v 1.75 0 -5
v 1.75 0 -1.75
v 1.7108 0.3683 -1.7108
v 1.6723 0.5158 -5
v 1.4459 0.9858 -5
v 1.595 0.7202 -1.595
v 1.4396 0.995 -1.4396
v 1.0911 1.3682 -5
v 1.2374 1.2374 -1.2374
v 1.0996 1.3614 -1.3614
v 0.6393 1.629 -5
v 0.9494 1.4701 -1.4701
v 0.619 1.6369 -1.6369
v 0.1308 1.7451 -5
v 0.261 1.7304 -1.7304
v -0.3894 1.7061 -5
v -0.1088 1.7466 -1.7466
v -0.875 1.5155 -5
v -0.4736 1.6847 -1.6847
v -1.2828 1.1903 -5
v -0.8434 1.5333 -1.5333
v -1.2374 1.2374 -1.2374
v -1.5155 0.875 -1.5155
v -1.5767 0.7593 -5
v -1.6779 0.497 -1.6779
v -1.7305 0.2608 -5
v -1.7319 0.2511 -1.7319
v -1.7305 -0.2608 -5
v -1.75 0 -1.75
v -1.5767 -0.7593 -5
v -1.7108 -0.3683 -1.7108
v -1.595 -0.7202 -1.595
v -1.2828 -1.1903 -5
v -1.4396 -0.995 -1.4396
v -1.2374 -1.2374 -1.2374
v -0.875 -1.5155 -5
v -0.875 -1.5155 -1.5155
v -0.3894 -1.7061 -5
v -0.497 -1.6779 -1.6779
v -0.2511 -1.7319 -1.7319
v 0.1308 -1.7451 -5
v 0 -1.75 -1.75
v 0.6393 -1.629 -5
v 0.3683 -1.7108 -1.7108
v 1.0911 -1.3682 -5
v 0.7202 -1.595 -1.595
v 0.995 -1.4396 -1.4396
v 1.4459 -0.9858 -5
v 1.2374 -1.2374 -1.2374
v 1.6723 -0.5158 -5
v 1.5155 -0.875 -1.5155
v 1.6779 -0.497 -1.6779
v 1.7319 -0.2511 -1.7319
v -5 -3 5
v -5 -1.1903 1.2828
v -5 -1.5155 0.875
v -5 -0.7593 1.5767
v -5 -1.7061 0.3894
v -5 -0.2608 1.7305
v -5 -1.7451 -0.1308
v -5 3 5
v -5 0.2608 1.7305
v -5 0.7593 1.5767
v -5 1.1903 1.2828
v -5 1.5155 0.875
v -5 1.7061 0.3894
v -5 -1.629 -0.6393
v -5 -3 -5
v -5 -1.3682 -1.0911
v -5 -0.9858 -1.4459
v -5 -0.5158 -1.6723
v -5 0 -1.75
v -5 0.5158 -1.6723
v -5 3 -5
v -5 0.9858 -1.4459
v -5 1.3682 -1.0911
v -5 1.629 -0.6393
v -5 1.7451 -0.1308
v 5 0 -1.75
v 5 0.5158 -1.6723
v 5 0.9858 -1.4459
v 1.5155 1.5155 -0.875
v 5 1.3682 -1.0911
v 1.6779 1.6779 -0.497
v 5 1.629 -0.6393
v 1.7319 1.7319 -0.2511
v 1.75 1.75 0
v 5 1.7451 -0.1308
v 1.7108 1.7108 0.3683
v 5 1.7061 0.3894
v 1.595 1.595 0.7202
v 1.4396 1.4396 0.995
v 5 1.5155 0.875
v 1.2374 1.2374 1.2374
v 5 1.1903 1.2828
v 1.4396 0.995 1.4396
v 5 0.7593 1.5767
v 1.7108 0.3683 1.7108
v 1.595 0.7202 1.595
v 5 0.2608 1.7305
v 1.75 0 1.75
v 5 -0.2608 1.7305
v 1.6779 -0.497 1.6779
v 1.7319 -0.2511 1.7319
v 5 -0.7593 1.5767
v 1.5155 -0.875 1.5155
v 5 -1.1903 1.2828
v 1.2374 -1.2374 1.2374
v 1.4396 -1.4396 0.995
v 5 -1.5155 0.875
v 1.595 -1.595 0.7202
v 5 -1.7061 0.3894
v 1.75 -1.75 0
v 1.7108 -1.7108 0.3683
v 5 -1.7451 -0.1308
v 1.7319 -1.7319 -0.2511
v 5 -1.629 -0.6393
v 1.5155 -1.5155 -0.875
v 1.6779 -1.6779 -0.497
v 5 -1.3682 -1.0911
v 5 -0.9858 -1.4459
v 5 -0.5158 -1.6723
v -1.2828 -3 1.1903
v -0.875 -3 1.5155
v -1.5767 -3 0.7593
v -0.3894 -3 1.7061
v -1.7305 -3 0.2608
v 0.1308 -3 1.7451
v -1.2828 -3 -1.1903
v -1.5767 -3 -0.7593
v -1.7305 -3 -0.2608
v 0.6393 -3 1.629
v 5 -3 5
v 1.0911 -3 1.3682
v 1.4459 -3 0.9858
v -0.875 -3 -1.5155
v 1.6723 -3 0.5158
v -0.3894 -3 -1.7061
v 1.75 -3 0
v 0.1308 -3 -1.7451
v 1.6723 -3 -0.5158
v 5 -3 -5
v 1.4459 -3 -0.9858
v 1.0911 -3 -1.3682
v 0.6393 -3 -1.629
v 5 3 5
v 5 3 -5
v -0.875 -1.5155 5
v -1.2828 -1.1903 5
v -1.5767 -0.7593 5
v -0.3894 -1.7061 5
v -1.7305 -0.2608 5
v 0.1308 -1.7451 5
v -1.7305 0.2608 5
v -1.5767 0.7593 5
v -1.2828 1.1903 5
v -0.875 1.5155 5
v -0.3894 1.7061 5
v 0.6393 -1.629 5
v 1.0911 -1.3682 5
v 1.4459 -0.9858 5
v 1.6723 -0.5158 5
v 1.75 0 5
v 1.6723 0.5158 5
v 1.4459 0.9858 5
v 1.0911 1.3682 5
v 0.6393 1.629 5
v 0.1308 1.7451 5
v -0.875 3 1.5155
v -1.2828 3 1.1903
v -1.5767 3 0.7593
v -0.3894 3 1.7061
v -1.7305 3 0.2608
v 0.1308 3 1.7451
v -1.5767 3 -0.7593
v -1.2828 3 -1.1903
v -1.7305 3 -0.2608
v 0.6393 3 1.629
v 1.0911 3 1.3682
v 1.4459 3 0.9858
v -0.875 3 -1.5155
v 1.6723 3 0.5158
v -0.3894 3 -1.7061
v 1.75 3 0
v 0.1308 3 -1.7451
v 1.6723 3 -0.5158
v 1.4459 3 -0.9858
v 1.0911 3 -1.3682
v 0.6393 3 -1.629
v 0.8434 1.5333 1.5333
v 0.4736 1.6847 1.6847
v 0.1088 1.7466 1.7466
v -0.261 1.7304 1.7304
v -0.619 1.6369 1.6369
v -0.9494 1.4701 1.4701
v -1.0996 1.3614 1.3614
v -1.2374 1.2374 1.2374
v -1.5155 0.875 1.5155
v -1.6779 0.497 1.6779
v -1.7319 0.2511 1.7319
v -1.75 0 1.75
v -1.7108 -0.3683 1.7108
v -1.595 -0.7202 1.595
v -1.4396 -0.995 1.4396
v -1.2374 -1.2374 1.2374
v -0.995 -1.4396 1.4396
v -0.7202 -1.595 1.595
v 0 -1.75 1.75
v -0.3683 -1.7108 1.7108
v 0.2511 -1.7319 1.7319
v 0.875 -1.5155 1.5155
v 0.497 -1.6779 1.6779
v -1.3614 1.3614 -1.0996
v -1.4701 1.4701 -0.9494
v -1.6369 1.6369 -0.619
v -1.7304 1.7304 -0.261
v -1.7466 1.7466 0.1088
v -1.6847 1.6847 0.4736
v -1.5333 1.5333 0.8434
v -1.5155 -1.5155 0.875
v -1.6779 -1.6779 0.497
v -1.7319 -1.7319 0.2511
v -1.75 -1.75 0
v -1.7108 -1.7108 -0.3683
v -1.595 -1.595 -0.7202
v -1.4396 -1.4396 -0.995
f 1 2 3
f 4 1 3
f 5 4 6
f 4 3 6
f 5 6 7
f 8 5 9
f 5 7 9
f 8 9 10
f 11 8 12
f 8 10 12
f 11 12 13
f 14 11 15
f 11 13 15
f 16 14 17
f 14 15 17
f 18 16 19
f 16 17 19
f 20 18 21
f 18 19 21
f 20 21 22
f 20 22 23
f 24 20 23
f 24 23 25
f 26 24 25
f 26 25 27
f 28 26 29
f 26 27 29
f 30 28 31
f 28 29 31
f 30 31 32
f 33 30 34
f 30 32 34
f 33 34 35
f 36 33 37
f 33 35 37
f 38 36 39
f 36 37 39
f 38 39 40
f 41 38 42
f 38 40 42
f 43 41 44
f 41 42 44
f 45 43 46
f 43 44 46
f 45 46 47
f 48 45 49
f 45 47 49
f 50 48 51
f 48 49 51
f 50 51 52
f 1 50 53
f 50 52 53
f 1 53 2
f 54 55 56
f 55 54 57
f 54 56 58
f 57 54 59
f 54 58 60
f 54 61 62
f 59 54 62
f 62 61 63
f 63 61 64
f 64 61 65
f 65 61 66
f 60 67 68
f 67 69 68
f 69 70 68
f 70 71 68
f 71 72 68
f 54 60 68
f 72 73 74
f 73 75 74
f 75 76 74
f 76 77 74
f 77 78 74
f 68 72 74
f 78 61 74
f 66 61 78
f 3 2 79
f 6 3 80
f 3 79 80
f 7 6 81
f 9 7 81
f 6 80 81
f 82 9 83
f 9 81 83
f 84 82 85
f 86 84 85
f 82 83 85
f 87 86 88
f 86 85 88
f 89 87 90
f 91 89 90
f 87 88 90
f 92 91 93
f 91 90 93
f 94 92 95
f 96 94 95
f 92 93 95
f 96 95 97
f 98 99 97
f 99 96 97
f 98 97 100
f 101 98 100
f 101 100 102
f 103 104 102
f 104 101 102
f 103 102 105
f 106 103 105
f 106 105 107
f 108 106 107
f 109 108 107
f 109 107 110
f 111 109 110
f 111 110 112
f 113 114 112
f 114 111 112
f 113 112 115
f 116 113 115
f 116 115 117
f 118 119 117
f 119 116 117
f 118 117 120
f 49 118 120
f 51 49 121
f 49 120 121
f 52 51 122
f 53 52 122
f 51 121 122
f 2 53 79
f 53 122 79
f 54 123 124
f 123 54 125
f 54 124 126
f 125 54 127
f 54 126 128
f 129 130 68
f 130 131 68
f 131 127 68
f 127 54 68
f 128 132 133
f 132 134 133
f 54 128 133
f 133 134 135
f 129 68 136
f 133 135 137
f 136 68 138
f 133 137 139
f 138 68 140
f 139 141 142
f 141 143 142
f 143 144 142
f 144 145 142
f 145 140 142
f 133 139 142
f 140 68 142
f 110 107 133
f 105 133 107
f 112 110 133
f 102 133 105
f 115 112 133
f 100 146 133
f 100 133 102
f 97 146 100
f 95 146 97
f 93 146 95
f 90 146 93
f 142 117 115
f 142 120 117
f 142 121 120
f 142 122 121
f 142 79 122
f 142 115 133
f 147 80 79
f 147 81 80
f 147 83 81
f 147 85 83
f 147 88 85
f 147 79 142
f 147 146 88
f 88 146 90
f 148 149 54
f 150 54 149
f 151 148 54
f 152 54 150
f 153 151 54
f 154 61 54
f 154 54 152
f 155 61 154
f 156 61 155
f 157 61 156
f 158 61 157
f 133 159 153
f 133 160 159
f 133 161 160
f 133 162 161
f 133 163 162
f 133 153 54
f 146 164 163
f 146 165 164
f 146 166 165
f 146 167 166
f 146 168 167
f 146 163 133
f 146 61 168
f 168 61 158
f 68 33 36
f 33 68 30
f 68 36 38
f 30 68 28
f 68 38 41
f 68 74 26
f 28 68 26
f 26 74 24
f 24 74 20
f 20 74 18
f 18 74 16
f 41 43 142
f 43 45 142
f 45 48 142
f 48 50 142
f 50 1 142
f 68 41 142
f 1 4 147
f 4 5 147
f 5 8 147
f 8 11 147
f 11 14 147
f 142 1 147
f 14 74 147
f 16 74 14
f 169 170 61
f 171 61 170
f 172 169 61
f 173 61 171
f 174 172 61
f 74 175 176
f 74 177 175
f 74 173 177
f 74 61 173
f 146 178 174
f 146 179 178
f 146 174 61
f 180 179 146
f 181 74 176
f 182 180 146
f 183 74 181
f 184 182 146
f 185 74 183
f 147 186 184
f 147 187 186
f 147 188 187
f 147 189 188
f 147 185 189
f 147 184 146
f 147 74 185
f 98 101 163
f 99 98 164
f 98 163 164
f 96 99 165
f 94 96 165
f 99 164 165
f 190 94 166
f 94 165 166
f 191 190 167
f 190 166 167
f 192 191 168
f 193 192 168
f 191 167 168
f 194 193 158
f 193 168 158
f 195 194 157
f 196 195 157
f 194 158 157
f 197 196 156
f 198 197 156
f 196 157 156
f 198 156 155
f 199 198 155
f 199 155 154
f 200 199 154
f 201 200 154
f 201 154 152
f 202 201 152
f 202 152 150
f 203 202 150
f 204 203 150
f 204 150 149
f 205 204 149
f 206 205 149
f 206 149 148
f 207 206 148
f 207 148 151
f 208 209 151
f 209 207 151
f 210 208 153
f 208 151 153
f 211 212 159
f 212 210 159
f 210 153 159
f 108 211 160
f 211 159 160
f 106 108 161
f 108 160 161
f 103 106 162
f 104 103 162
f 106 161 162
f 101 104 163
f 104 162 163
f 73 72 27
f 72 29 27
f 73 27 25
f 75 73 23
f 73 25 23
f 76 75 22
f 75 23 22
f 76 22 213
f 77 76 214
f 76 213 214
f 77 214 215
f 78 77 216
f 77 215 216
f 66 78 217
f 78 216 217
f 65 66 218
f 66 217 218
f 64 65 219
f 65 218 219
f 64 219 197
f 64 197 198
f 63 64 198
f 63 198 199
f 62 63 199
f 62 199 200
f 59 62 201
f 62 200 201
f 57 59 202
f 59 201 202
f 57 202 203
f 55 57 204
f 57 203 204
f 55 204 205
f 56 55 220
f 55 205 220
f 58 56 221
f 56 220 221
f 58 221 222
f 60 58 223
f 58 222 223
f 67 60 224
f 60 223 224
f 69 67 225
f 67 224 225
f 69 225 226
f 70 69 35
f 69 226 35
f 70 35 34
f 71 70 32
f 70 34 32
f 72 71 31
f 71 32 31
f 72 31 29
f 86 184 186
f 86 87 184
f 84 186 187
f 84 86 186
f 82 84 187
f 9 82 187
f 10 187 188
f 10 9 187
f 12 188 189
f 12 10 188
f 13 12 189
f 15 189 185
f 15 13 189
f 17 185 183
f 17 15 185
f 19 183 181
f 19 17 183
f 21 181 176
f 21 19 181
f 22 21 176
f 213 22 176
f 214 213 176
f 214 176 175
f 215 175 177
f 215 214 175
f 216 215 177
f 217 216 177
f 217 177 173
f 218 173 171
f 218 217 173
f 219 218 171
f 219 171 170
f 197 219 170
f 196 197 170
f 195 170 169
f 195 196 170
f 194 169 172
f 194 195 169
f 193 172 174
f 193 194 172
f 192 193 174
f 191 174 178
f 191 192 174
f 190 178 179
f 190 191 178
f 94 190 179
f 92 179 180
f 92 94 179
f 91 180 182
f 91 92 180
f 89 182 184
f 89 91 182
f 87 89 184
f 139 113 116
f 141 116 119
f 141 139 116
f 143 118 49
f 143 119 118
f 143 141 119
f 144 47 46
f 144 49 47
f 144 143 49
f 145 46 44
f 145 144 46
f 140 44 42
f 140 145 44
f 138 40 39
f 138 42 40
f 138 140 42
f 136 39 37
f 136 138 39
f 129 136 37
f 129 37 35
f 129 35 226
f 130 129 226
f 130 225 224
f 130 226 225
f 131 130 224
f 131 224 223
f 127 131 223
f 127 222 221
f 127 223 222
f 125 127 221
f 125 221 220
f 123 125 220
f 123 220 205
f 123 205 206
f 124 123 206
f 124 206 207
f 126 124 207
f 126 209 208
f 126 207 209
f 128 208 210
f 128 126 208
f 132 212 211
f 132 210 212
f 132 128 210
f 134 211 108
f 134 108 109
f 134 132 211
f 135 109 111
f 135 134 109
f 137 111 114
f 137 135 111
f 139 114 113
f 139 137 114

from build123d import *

# Parameters (mm, degrees)
SKETCH_1_W          = 10
SKETCH_1_H          = 10
SKETCH_1_R          = 1.75
EXTRUDE_1_DEPTH     = 3
SKETCH_3_R          = 1.75
CUT_EXTRUDE_1_DEPTH = 8.5
SKETCH_4_R          = 1.75
CUT_EXTRUDE_2_DEPTH = 8.5


with BuildPart() as part:
    # 草图1 → 凸台-拉伸1 (new body, symmetric)
    with BuildSketch(Plane(origin=(0, 0, 0), x_dir=(1, 0, 0), z_dir=(0, 1, 0))):
        Rectangle(SKETCH_1_W, SKETCH_1_H)
        Circle(SKETCH_1_R, mode=Mode.SUBTRACT)
    extrude(amount=EXTRUDE_1_DEPTH, both=True)

    # 草图3 → 切除-拉伸1 (cut, symmetric)
    with BuildSketch(Plane.XY):
        Circle(SKETCH_3_R)
    extrude(amount=CUT_EXTRUDE_1_DEPTH, both=True, mode=Mode.SUBTRACT)

    # 草图4 → 切除-拉伸2 (cut, symmetric)
    with BuildSketch(Plane(origin=(0, 0, 0), x_dir=(0, 0, -1), z_dir=(1, 0, 0))):
        Circle(SKETCH_4_R)
    extrude(amount=CUT_EXTRUDE_2_DEPTH, both=True, mode=Mode.SUBTRACT)


solid = part.part
